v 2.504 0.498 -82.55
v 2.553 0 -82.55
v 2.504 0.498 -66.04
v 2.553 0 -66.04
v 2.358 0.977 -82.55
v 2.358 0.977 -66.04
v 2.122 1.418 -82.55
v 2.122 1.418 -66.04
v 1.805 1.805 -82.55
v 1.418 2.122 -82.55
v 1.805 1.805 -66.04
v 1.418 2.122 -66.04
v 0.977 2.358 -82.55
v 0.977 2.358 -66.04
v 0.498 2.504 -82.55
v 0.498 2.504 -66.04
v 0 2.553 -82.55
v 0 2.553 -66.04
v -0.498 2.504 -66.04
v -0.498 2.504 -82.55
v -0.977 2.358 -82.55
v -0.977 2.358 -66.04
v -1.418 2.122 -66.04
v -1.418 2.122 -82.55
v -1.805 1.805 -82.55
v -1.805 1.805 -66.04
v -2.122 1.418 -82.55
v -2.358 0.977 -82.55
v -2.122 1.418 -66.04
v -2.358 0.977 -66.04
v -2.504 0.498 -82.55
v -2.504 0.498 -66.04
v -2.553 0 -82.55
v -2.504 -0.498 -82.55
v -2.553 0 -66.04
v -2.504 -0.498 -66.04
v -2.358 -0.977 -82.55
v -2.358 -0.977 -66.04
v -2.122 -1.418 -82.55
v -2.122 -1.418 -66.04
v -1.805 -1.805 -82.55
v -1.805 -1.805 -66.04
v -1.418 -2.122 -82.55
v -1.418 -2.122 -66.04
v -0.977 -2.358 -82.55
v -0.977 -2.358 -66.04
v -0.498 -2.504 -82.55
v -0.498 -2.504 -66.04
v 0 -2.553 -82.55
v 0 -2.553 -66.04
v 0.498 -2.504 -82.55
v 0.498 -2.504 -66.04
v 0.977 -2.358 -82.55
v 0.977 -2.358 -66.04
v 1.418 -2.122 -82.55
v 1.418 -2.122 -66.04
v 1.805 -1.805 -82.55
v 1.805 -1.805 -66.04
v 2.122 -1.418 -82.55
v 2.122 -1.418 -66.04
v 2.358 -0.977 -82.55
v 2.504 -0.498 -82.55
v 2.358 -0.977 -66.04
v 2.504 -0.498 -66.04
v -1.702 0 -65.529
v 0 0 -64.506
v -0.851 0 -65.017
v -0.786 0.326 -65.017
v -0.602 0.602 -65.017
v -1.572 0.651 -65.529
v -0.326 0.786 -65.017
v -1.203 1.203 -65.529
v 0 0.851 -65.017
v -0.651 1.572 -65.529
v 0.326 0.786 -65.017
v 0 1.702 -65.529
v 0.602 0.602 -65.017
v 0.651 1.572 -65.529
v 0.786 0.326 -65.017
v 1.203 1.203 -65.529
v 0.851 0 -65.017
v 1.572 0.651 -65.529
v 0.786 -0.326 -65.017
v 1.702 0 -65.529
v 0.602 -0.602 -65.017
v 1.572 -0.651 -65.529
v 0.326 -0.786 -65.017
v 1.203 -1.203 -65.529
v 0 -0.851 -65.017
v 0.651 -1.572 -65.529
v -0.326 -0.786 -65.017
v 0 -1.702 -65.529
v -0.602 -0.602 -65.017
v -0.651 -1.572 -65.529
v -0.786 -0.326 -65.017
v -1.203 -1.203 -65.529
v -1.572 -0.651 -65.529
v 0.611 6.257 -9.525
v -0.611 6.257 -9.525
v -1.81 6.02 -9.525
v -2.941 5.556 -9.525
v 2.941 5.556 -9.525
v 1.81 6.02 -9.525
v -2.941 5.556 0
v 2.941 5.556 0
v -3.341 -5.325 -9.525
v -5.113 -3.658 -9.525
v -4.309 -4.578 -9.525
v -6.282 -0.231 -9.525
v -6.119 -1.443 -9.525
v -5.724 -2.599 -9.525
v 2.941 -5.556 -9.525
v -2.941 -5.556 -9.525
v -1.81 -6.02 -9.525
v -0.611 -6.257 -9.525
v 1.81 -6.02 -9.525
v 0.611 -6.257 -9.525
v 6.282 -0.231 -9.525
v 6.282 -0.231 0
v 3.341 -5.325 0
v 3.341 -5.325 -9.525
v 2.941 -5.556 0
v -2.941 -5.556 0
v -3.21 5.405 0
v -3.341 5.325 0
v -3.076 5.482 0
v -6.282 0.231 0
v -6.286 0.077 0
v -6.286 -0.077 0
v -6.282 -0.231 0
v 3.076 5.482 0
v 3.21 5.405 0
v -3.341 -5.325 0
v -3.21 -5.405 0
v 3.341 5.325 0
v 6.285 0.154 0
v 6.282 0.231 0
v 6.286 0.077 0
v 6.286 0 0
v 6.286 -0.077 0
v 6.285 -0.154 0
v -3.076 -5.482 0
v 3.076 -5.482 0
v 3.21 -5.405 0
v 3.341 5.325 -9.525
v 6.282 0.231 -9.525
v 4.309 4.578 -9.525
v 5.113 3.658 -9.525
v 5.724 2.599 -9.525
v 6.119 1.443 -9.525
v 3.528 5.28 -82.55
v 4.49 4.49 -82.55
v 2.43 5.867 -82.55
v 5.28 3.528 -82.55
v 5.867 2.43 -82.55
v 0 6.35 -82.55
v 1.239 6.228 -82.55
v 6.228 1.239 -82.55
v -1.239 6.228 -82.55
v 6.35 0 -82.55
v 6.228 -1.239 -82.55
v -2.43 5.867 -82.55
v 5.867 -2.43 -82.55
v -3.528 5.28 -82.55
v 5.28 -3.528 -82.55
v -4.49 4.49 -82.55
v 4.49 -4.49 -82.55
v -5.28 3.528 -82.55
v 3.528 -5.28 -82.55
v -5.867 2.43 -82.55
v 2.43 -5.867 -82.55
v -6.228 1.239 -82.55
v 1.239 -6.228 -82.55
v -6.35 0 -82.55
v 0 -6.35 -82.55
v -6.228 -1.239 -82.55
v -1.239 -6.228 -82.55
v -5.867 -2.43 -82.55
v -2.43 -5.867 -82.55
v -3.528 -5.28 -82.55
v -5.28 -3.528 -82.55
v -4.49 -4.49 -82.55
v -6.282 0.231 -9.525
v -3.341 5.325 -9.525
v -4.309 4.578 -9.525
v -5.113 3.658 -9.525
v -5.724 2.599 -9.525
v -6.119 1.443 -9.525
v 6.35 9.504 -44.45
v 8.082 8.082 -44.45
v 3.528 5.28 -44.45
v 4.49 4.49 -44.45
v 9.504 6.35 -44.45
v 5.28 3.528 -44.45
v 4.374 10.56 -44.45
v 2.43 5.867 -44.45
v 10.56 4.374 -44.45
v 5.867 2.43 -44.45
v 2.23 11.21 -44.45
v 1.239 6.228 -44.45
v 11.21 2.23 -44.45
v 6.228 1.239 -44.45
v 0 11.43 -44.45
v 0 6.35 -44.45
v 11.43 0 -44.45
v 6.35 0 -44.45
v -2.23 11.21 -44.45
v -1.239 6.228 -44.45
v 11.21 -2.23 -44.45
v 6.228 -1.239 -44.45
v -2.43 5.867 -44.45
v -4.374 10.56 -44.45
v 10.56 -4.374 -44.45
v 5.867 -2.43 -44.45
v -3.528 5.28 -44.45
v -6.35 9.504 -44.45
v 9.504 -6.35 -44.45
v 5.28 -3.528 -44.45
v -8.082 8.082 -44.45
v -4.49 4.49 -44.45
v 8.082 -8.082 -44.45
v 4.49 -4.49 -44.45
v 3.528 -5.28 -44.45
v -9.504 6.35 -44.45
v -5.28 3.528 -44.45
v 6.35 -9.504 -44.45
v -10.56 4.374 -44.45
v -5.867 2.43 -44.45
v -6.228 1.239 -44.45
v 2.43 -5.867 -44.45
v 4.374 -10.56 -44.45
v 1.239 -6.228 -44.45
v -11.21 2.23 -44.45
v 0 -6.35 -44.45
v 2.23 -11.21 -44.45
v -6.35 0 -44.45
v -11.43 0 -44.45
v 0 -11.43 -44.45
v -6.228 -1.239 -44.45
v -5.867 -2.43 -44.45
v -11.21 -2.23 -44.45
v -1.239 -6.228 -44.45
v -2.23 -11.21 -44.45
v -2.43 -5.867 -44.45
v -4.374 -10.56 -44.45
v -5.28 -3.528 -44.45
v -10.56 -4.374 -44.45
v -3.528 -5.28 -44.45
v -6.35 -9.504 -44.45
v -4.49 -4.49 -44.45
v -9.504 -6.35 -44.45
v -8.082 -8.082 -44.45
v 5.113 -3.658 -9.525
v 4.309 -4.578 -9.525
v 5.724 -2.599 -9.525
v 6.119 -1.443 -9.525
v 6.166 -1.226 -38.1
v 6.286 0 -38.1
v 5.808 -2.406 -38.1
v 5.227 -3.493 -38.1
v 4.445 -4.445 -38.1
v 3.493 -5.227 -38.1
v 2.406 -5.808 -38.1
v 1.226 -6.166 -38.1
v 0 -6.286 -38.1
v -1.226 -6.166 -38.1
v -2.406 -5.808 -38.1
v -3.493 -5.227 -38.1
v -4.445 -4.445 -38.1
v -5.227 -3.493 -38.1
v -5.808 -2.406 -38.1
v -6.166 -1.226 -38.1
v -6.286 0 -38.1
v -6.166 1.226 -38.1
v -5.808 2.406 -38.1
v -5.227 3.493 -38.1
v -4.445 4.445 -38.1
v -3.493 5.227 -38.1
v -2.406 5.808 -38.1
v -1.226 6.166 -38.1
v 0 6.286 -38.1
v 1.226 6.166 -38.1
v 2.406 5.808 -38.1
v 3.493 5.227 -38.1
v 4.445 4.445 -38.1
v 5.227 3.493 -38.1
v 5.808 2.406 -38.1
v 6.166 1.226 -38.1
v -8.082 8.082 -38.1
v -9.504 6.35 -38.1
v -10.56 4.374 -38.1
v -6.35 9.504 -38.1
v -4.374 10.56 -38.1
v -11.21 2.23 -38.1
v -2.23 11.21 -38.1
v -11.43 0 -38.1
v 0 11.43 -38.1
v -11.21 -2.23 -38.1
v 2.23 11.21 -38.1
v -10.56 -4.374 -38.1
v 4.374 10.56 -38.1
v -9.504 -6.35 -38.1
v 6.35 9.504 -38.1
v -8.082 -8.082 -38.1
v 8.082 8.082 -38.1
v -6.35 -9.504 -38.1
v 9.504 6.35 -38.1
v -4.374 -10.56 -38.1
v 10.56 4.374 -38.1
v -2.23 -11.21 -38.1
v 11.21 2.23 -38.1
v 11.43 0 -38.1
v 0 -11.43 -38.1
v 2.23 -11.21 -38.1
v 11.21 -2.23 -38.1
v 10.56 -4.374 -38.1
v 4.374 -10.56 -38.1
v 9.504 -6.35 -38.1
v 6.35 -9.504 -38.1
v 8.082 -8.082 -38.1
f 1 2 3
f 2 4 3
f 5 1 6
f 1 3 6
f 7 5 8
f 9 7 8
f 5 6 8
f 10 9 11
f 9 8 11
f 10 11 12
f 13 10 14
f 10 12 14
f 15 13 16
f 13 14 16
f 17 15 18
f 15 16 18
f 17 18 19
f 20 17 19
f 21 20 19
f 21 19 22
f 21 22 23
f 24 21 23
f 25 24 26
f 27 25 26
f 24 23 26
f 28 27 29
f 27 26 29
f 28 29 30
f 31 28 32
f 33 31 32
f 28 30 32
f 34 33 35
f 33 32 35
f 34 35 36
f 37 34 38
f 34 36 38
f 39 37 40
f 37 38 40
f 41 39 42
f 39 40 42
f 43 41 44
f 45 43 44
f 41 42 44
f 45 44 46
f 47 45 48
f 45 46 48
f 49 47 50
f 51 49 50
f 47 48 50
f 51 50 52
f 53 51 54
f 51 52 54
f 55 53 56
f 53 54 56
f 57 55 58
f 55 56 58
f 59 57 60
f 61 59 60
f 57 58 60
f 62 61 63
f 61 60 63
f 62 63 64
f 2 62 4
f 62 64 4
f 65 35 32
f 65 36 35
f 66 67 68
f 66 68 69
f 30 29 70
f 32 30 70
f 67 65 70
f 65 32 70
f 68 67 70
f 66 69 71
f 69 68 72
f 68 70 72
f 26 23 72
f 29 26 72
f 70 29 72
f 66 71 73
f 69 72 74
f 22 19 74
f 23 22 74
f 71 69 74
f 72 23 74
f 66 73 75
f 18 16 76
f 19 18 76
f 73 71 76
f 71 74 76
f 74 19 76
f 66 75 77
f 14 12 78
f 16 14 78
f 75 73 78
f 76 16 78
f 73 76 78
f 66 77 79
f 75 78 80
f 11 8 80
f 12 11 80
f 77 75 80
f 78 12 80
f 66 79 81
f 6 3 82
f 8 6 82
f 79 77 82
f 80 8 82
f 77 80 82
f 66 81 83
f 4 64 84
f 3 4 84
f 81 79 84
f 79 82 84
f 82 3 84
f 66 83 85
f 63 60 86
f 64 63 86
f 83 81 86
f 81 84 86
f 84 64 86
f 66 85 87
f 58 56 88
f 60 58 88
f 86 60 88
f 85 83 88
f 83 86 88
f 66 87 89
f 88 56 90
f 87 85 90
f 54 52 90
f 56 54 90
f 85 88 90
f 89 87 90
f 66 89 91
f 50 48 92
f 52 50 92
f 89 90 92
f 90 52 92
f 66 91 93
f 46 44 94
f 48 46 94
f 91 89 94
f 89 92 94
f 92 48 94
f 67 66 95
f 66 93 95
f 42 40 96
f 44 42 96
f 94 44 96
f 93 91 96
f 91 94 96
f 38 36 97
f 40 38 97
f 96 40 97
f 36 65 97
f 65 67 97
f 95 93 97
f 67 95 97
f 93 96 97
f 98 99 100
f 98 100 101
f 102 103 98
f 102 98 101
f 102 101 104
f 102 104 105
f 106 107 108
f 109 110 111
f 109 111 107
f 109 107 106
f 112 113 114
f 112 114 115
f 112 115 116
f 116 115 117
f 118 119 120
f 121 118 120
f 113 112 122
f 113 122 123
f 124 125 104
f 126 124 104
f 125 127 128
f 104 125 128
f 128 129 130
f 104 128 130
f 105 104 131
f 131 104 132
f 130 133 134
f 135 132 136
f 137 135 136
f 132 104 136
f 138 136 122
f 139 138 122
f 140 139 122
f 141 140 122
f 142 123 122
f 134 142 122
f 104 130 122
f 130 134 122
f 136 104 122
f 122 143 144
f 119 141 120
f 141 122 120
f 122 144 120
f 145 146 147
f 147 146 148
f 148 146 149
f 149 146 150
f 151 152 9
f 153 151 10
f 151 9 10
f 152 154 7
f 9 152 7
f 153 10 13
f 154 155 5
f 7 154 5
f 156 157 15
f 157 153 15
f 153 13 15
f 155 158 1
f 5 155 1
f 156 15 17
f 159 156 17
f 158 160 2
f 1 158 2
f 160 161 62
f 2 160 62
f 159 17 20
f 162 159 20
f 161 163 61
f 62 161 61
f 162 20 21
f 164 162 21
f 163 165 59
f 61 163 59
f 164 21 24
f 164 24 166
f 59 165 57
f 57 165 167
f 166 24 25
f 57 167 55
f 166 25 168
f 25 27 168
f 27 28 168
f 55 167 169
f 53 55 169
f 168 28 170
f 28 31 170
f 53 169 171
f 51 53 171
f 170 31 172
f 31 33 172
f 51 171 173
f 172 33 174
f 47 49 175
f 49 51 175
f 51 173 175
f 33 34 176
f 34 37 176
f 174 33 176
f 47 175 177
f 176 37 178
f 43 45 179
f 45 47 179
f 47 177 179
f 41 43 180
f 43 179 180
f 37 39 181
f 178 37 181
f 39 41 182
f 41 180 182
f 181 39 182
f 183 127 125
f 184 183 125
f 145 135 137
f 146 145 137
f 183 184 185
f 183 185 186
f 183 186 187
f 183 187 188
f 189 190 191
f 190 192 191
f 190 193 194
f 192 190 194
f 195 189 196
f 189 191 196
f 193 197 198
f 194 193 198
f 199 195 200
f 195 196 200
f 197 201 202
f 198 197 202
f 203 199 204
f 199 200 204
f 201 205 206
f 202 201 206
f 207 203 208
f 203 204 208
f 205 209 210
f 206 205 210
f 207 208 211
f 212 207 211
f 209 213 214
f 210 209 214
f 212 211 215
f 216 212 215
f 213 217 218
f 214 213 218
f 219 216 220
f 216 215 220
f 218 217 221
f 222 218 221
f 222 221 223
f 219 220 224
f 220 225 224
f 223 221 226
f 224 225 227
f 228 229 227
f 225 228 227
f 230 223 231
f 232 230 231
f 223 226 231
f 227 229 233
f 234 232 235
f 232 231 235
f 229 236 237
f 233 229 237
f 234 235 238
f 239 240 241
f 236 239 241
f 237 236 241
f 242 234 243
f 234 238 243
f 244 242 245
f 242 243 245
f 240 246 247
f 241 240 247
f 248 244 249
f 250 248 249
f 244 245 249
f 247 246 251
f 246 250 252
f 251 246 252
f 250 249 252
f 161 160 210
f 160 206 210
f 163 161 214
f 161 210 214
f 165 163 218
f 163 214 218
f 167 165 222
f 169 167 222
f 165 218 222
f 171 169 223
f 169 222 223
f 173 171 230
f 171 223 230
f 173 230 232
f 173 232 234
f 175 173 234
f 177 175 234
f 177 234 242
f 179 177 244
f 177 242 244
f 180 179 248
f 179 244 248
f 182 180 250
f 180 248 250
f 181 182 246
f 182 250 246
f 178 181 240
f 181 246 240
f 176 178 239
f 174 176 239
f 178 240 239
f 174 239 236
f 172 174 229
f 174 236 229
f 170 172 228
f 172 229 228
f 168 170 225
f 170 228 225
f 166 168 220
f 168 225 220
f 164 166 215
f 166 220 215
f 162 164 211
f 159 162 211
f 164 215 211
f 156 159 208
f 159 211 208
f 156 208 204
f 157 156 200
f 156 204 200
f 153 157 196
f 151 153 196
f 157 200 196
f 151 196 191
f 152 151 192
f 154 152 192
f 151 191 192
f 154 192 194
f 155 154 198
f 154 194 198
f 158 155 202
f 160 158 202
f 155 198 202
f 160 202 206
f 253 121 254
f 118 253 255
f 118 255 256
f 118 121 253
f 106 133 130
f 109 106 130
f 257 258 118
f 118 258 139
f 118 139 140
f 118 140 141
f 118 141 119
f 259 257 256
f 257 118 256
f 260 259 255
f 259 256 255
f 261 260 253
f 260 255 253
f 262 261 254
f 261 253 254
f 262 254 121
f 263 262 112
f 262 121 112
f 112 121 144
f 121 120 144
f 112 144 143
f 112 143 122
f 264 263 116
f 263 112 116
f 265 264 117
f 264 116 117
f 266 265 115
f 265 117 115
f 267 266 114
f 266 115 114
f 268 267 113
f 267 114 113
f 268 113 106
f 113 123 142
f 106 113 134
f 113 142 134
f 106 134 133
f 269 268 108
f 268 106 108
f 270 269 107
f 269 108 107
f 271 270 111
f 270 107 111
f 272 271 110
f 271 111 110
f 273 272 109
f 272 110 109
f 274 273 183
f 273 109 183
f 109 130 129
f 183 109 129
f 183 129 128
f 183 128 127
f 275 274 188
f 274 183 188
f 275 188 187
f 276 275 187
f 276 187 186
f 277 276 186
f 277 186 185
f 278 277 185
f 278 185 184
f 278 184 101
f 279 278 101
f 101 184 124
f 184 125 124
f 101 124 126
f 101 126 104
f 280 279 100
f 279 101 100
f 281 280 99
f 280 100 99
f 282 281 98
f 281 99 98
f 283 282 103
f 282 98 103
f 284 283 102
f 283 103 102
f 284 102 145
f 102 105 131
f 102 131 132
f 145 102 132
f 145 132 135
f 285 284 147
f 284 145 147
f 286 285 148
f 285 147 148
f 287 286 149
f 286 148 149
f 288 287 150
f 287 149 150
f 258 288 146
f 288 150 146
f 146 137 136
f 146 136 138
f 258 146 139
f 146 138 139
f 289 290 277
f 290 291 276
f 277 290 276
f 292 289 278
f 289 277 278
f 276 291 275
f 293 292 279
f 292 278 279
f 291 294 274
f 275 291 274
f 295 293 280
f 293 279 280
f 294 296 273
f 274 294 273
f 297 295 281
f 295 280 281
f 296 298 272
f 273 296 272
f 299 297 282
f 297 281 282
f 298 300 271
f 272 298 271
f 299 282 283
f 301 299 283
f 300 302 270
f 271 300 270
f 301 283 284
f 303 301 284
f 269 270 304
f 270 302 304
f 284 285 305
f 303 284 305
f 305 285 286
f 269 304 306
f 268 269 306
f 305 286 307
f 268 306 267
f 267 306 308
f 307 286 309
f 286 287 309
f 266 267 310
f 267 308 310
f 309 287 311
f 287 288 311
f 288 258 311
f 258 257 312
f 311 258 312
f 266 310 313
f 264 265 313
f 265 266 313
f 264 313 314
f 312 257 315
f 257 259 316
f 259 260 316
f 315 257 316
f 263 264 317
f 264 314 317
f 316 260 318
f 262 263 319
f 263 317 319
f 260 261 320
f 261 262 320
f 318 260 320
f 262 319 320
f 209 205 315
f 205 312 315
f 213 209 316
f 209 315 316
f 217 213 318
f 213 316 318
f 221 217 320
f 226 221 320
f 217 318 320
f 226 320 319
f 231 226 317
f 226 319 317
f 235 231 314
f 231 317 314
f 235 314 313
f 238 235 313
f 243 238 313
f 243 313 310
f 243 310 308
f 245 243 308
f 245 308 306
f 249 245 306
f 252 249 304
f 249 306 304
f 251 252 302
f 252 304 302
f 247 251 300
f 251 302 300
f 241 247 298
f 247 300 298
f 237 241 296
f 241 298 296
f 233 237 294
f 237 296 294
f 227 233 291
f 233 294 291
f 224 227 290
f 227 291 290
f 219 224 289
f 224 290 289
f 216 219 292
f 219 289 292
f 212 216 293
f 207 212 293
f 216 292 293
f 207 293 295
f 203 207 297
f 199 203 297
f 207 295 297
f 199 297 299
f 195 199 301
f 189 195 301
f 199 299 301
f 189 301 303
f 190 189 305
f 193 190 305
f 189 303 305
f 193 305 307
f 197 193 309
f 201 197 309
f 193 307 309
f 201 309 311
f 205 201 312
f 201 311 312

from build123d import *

# Parameters (mm, degrees)
F_1_4_20_TAPPED_HOLE1_D     = 5.1054
F_1_4_20_TAPPED_HOLE1_DEPTH = 16.51
F_1_4_20_TAPPED_HOLE1_TIP   = 1.533816902
CUT_EXTRUDE1_DEPTH          = 9.525


with BuildPart() as part:
    # Sketch1 → Revolve2 (revolve)
    with BuildSketch(Plane(origin=(0, 0, 0), x_dir=(0, 0, -1), z_dir=(1, 0, 0)), mode=Mode.PRIVATE) as revolve2_sk:
        Polygon((38.1, 6.2865), (0, 6.2865), (0, 0), (82.55, 0), (82.55, 6.35), (44.45, 6.35), (44.45, 11.43), (38.1, 11.43), align=None)
    revolve(revolve2_sk.sketch.rotate(Axis((0, 0, 0), (0, 0, -1)), 90), axis=Axis((0, 0, 0), (0, 0, -1)))

    # 1/4-20 Tapped Hole1
    with Locations(Plane(origin=(0, 0, -82.55), x_dir=(-1, 0, 0), z_dir=(0, 0, -1))):
        with Locations((0, 0)):
            Hole(F_1_4_20_TAPPED_HOLE1_D / 2, depth=F_1_4_20_TAPPED_HOLE1_DEPTH)
            with Locations((0, 0, -(F_1_4_20_TAPPED_HOLE1_DEPTH + F_1_4_20_TAPPED_HOLE1_TIP / 2))):  # 118° drill point
                Cone(0, F_1_4_20_TAPPED_HOLE1_D / 2, F_1_4_20_TAPPED_HOLE1_TIP, mode=Mode.SUBTRACT)

    # Sketch4 → Cut-Extrude1 (cut)
    with BuildSketch(Plane.XY):
        with BuildLine():
            ThreePointArc((2.9407768, 5.55625), (0, 6.2865), (-2.9407768, 5.55625))
            Line((-2.9407768, 5.55625), (2.9407768, 5.55625))
        make_face()
        with BuildLine():
            ThreePointArc((6.28224205, 0.231337584), (5.444268701, 3.14325), (3.34146525, 5.324912416))
            Line((3.34146525, 5.324912416), (6.28224205, 0.231337584))
        make_face()
        with BuildLine():
            Line((6.28224205, -0.231337584), (3.34146525, -5.324912416))
            ThreePointArc((3.34146525, -5.324912416), (5.444268701, -3.14325), (6.28224205, -0.231337584))
        make_face()
        with BuildLine():
            Line((2.9407768, -5.55625), (-2.9407768, -5.55625))
            ThreePointArc((-2.9407768, -5.55625), (0, -6.2865), (2.9407768, -5.55625))
        make_face()
        with BuildLine():
            Line((-3.34146525, -5.324912416), (-6.28224205, -0.231337584))
            ThreePointArc((-6.28224205, -0.231337584), (-5.444268701, -3.14325), (-3.34146525, -5.324912416))
        make_face()
        with BuildLine():
            ThreePointArc((-3.34146525, 5.324912416), (-5.444268701, 3.14325), (-6.28224205, 0.231337584))
            Line((-6.28224205, 0.231337584), (-3.34146525, 5.324912416))
        make_face()
    extrude(amount=-CUT_EXTRUDE1_DEPTH, mode=Mode.SUBTRACT)


solid = part.part
